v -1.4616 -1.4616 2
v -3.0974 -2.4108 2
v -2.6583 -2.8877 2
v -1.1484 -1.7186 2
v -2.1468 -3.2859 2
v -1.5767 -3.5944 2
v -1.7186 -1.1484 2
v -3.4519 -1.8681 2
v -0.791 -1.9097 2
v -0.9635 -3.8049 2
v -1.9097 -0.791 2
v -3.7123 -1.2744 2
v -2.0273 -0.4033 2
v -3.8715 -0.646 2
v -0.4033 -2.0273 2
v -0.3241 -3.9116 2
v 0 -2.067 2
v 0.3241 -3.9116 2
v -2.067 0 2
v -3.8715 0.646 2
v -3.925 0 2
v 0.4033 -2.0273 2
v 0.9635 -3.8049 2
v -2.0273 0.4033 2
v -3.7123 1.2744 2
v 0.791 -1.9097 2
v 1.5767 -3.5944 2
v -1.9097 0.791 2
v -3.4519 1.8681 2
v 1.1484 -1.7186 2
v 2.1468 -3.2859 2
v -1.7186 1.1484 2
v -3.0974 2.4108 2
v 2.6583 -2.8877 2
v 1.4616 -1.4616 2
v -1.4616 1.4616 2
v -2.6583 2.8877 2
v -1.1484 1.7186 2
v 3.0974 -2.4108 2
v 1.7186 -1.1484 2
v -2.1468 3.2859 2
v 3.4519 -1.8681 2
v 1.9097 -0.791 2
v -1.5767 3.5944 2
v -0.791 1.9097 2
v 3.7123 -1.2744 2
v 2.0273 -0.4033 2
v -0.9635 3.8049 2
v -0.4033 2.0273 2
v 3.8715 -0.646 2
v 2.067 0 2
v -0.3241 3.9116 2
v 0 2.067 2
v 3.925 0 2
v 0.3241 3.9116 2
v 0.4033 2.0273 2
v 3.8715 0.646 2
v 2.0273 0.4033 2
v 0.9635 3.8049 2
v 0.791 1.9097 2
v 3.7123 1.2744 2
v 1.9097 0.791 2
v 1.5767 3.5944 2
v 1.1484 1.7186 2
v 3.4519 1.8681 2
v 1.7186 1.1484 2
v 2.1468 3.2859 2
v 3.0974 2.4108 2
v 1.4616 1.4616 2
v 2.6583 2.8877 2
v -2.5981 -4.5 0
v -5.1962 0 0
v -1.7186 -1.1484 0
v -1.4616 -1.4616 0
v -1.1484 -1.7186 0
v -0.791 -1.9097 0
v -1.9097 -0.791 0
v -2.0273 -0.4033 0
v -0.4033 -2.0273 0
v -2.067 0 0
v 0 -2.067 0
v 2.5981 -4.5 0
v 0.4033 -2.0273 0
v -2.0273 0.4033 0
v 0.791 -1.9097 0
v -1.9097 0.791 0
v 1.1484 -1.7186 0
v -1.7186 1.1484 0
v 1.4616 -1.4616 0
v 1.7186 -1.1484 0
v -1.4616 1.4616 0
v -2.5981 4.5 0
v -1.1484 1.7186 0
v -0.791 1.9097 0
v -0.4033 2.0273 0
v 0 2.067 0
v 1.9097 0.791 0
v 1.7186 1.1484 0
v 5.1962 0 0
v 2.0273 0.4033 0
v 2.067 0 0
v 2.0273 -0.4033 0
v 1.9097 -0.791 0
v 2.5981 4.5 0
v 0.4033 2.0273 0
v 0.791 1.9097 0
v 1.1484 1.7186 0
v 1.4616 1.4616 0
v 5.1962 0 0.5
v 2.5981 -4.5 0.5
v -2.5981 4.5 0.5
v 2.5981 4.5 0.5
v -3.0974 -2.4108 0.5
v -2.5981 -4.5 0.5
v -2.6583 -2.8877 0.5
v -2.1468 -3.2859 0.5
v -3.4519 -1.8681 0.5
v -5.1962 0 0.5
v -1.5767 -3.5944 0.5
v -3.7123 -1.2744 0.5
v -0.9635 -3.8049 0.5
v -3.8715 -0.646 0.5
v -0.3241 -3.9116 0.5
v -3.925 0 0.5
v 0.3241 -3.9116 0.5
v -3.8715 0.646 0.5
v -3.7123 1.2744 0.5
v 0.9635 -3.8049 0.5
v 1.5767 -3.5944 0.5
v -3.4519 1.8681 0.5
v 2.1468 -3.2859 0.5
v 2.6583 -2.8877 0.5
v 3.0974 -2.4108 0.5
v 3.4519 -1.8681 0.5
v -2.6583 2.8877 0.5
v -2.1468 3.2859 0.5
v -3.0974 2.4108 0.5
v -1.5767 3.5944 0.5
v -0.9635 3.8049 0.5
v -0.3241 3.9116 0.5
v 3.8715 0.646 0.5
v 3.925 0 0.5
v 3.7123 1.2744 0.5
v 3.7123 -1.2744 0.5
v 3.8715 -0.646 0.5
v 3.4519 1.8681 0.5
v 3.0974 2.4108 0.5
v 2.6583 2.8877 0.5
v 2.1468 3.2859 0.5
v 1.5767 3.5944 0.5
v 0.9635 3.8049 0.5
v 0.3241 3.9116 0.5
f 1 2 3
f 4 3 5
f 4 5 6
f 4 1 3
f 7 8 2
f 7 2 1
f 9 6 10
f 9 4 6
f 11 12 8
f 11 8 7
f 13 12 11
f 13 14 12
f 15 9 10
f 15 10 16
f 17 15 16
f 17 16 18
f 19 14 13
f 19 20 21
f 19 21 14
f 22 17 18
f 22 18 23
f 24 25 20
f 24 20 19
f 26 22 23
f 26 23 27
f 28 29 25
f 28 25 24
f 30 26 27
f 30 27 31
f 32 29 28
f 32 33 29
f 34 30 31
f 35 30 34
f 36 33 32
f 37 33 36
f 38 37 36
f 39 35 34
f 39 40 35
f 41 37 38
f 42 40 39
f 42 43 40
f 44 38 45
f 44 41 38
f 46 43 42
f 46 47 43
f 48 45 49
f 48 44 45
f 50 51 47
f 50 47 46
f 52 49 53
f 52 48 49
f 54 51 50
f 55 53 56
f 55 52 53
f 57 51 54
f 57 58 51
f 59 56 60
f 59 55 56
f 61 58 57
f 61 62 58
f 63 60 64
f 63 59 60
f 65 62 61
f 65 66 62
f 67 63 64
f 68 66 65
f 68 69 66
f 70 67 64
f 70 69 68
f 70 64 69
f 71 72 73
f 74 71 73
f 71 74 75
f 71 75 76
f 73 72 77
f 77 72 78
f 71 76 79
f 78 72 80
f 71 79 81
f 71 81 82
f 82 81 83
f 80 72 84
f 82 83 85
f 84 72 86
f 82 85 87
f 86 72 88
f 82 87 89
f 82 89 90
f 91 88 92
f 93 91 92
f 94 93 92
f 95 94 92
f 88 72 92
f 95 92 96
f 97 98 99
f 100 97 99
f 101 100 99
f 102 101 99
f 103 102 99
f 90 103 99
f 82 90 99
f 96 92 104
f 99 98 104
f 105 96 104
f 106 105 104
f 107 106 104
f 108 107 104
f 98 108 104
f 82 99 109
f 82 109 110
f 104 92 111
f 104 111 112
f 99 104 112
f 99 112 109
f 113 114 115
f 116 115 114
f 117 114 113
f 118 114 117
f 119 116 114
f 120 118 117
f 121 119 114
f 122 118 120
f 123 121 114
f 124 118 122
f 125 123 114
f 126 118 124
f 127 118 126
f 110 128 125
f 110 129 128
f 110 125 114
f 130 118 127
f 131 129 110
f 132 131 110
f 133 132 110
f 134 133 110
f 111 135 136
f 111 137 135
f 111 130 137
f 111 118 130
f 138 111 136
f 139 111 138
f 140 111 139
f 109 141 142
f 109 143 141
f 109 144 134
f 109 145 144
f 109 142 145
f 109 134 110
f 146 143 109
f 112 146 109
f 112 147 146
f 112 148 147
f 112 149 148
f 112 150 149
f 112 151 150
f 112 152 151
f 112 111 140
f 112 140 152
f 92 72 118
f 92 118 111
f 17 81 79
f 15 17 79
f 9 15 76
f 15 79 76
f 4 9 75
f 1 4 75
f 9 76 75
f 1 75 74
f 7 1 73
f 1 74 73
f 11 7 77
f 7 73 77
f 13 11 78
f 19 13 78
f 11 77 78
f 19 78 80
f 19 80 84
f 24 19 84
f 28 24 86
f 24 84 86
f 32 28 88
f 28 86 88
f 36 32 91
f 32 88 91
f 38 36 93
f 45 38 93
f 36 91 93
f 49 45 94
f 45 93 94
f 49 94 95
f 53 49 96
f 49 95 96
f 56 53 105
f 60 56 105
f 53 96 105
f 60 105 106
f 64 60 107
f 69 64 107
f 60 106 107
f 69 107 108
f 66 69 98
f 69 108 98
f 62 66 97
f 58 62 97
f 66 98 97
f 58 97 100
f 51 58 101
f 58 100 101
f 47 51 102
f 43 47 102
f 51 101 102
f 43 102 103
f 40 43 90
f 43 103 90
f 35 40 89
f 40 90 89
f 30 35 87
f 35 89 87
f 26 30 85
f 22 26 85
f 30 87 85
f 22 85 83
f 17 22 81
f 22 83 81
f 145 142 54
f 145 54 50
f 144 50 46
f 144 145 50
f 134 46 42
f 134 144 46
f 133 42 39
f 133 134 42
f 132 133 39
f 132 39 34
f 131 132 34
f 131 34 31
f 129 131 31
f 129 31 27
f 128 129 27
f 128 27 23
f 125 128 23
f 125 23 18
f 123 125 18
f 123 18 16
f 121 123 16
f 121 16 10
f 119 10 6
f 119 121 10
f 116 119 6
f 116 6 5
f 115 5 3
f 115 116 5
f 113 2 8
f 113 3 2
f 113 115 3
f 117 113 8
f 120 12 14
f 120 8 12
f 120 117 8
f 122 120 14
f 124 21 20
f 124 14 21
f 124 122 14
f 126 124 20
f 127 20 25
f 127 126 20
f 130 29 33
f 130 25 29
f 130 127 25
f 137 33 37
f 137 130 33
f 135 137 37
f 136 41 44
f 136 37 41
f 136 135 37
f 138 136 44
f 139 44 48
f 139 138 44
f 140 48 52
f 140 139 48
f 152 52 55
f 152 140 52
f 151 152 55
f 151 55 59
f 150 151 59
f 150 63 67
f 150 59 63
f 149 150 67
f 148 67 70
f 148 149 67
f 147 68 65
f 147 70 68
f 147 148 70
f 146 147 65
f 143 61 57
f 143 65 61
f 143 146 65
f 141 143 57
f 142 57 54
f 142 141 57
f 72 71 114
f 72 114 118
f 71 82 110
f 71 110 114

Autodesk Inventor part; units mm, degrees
ref_plane "YZ Plane" through (0, 0, 0) normal (1, 0, 0) x (0, 1, 0)
ref_plane "XZ Plane" through (0, 0, 0) normal (0, 1, 0) x (-1, 0, 0)
ref_plane "XY Plane" through (0, 0, 0) normal (0, 0, 1) x (1, 0, 0)
sketch "スケッチ1" plane through (0, 0, 0) normal (0, 0, 1) x (1, 0, 0)
  line L0 (5.1962, 0) -> (2.5981, -4.5)
  line L1 (2.5981, -4.5) -> (-2.5981, -4.5)
  line L2 (-2.5981, -4.5) -> (-5.1962, 0)
  line L3 (-5.1962, 0) -> (-2.5981, 4.5)
  line L4 (-2.5981, 4.5) -> (2.5981, 4.5)
  line L5 (2.5981, 4.5) -> (5.1962, 0)
  point P0 (0, 0)
  point P1 (0, 0)
  dimension "d0" = 9
extrude "押し出し1" add sketch "スケッチ1" along normal blind 0.5
sketch "スケッチ2" plane through (0, 0, 0.5) normal (0, 0, 1) x (1, 0, 0)
  circle A0 centre (0, 0) radius 3.925
  dimension "d3" = 7.85
extrude "押し出し2" add sketch "スケッチ2" along normal blind 1.5
sketch "スケッチ3" plane through (0, 0, 2) normal (0, 0, 1) x (1, 0, 0)
  point P0 (0, 0)
hole "穴1" at (0, 0, 2) direction (0, 0, -1) diameter 4.134 depth 2 thread size "M5x0.8" class "6H" standard "ISO Metric profile"
properties part number "TF-M5-2"
